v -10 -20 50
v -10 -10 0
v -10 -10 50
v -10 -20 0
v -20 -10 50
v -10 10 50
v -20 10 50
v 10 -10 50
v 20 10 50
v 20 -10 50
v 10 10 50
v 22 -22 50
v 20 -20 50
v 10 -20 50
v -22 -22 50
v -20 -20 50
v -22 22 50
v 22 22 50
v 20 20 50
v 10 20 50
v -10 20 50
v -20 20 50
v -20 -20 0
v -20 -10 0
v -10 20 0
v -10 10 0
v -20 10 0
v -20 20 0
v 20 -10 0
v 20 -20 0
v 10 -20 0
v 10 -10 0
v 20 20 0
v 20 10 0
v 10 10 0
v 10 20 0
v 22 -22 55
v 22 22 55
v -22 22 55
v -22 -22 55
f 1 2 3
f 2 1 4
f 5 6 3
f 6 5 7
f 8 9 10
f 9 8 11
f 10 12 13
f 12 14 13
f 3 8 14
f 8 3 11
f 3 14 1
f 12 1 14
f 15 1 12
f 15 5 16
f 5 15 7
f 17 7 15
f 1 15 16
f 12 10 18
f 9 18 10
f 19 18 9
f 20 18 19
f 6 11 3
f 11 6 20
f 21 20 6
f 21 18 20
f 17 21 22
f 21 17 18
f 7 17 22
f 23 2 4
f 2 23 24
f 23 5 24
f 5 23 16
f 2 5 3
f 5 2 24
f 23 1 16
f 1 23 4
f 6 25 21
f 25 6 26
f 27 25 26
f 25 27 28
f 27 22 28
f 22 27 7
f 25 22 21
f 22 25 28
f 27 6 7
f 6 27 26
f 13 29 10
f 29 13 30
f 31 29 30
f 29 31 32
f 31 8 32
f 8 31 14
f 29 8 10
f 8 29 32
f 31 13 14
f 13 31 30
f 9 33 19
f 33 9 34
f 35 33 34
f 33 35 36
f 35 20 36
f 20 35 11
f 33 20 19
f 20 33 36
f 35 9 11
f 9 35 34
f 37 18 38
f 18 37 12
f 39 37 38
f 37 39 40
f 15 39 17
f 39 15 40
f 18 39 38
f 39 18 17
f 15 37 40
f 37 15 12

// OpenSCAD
pied_ep = 10;
pied_ht = 50;

table_lg = 40;
table_ep = 5;
table_rebord = 2;

union()
{
    for(vX=[-1,1], vY=[-1,1])
        translate([vX*(table_lg-pied_ep)/2,vY*(table_lg-pied_ep)/2,pied_ht/2])
        cube([pied_ep, pied_ep, pied_ht], center=true);
    
    translate([0,0,pied_ht+table_ep/2])
    cube([table_lg+2*table_rebord,table_lg+2*table_rebord,table_ep], center=true);
}
